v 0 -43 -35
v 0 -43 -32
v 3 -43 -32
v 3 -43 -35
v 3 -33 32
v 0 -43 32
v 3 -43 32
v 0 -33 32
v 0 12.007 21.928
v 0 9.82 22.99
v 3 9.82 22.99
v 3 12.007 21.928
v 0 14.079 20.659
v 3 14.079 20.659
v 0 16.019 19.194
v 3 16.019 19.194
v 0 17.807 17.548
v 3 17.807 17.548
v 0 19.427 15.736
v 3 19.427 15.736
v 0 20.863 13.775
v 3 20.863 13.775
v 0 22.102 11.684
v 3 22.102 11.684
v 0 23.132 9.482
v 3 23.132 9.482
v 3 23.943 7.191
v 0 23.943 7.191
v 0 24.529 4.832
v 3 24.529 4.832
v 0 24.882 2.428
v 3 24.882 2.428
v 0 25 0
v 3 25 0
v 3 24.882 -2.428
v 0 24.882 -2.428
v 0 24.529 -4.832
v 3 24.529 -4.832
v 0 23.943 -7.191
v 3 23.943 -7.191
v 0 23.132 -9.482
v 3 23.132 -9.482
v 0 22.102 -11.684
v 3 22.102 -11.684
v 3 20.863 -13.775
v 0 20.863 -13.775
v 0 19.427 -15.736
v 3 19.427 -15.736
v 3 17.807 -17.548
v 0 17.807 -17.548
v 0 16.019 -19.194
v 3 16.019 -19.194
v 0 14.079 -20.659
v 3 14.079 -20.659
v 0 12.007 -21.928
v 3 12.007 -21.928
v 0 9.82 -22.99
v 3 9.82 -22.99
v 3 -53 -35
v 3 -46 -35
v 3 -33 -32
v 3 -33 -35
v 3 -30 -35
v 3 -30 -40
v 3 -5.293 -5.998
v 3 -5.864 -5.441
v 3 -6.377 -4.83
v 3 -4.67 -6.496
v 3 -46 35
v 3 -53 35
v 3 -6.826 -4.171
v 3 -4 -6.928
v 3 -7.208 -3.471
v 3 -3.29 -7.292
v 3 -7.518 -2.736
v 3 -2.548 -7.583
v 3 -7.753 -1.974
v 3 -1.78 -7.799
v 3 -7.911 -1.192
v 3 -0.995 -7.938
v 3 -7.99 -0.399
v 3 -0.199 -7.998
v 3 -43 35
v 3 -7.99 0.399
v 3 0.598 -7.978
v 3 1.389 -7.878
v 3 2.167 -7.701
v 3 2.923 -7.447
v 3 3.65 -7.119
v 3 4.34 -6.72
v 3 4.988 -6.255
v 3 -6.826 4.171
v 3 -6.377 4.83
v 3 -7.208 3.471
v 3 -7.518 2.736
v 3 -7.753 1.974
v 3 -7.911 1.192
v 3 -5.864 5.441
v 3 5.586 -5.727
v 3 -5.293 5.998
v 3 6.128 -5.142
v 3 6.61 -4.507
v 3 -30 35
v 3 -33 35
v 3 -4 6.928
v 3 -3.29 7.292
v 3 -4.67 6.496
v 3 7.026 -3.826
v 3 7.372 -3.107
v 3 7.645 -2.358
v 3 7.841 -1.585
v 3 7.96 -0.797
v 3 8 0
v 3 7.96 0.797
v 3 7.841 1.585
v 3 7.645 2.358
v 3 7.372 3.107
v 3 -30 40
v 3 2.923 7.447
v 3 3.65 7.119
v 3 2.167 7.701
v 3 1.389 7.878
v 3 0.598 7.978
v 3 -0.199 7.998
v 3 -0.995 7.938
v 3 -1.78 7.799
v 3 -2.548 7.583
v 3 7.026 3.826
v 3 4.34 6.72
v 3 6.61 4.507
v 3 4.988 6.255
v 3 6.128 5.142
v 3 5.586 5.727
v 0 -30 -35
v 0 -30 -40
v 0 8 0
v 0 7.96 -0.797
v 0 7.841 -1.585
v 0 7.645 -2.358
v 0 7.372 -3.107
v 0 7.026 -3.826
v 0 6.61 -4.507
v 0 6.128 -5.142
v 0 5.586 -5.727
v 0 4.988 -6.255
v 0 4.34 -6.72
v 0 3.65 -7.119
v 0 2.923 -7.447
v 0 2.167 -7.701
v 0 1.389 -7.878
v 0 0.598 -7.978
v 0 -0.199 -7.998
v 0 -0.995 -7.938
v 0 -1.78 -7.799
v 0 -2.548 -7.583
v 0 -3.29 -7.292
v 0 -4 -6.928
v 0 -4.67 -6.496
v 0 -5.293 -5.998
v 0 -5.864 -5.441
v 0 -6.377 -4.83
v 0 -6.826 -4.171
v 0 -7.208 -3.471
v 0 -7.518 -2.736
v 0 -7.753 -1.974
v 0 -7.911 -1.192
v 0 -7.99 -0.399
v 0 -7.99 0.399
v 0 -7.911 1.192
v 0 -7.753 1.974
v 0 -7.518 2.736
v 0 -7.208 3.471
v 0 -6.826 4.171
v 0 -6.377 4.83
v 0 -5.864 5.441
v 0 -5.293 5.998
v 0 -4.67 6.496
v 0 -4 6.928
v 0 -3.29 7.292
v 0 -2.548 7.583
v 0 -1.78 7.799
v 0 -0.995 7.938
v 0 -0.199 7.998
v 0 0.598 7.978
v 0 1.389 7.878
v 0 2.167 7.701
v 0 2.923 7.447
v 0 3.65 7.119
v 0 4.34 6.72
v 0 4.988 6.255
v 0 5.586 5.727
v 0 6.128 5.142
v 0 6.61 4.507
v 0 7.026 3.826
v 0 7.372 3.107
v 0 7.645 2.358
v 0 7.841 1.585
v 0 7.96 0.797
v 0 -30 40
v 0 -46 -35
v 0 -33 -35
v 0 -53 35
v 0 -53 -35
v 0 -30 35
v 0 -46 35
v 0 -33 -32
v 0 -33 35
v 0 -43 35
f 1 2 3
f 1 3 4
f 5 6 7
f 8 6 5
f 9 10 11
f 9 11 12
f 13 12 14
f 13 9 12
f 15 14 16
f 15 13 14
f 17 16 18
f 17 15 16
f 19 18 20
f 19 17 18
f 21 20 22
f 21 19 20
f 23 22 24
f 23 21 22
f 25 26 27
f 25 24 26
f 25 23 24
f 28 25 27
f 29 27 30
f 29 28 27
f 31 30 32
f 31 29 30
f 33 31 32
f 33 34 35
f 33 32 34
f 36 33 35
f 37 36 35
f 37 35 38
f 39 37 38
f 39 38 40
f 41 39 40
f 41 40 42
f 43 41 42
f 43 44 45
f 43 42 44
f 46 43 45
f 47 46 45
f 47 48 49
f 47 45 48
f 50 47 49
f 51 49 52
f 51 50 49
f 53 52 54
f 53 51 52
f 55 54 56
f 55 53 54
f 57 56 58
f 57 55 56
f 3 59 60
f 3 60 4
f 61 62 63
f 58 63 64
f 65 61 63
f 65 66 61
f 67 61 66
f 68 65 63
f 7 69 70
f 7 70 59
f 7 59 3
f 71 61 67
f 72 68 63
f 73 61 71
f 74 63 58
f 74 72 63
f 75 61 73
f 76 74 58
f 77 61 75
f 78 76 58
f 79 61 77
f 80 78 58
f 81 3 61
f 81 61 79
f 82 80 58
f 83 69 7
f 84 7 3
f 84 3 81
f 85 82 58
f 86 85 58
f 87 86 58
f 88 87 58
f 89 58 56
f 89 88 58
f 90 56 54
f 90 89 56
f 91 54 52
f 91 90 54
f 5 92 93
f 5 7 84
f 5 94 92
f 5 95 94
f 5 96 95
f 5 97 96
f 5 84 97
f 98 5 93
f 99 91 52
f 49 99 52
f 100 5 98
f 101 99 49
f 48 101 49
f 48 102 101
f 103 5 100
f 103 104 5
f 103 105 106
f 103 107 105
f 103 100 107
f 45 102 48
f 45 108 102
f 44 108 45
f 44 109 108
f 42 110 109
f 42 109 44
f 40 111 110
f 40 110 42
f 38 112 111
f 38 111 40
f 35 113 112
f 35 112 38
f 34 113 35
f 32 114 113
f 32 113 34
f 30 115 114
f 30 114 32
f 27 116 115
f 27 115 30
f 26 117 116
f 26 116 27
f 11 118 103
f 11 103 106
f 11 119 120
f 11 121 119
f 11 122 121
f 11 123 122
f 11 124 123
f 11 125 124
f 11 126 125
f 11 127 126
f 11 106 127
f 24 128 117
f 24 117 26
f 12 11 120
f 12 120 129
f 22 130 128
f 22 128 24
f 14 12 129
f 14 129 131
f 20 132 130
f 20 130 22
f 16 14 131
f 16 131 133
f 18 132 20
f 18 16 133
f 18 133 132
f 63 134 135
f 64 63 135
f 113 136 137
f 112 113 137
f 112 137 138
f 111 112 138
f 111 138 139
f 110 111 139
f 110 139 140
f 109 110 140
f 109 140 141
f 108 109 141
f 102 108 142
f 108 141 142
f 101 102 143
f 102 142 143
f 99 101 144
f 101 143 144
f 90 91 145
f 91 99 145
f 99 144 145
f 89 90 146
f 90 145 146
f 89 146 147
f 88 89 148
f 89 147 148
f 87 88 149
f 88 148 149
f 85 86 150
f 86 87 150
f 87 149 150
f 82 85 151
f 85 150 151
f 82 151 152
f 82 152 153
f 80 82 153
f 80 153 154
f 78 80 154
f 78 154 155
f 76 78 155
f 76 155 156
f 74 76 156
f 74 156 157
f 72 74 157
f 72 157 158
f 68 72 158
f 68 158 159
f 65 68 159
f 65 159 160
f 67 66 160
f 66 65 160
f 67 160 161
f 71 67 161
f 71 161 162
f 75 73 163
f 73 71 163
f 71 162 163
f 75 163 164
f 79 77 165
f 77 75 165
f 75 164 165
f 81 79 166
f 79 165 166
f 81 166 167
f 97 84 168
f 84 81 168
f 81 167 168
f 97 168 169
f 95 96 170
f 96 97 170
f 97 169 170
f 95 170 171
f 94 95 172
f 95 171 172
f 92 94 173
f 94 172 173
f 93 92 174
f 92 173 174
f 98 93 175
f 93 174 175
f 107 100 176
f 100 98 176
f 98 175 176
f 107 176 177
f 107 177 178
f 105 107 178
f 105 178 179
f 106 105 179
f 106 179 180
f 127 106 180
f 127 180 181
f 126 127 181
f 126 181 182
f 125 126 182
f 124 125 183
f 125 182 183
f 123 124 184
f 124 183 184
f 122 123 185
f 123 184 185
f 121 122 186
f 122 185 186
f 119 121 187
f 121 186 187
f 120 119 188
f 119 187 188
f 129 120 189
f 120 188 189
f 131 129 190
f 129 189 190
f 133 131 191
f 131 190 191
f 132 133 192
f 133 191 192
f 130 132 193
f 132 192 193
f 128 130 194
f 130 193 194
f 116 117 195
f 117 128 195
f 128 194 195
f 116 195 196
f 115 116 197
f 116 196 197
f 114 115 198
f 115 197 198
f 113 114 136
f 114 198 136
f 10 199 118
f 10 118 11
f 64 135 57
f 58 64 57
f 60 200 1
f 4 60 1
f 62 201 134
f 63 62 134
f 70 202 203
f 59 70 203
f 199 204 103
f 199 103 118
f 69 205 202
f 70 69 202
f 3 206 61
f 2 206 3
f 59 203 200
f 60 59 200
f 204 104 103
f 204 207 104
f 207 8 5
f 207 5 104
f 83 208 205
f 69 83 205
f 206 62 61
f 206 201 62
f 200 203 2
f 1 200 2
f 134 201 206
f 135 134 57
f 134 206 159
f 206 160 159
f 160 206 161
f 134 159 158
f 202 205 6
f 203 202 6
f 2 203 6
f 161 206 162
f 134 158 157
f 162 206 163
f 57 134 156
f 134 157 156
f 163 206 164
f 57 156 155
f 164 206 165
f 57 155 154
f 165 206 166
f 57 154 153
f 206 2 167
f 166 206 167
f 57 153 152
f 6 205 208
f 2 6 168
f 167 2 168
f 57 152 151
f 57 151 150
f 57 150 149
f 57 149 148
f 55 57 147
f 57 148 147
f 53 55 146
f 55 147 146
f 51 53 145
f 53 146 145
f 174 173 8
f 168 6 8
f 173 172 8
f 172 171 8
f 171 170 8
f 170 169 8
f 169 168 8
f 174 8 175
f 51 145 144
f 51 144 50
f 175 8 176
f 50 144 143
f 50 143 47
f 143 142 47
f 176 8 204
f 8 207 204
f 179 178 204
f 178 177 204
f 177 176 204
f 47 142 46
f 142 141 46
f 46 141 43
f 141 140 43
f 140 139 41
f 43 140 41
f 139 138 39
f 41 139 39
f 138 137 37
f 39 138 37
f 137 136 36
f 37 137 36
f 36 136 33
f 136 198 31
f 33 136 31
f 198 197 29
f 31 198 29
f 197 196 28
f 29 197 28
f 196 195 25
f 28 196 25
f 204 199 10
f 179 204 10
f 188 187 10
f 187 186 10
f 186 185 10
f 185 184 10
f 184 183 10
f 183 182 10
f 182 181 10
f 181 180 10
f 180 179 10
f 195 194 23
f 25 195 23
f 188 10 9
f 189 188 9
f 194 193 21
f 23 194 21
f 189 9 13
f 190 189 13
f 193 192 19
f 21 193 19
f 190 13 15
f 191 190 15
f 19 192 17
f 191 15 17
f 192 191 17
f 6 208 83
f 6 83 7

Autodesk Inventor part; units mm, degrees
ref_plane "YZ Plane" through (0, 0, 0) normal (1, 0, 0) x (0, 1, 0)
ref_plane "XZ Plane" through (0, 0, 0) normal (0, 1, 0) x (-1, 0, 0)
ref_plane "XY Plane" through (0, 0, 0) normal (0, 0, 1) x (1, 0, 0)
sketch "Sketch1" plane through (0, 0, 0) normal (1, 0, 0) x (0, 1, 0)
  circle A0 centre (0, 0) radius 8
  arc A1 (-25, 0) -> (9.8205, -22.9904) centre (0, 0) ccw construction
  line L0 (0, 0) -> (-30, 0) construction
  line L1 (-30, 0) -> (-30, -35) construction
  line L2 (-30, -40) -> (9.8205, -22.9904)
  line L3 (-30, 0) -> (-30, 35) construction
  line L4 (-30, 40) -> (9.8205, 22.9904)
  line L5 (-30, 0) -> (-33, 0) construction
  line L6 (-33, 0) -> (-33, -35) construction
  line L7 (-33, -35) -> (-30, -35)
  line L8 (-33, 0) -> (-33, 32) construction
  line L9 (-33, 35) -> (-30, 35)
  line L10 (-33, 35) -> (-43, 35) construction
  line L11 (-43, 35) -> (-43, -32) construction
  line L12 (-43, -35) -> (-33, -35) construction
  line L13 (-33, -35) -> (-33, -32)
  line L14 (-33, 35) -> (-43, 35) construction
  line L15 (-43, 35) -> (-43, 32)
  line L16 (-43, 32) -> (-33, 32)
  line L17 (-33, 32) -> (-33, 35)
  line L18 (-43, -35) -> (-33, -35) construction
  line L19 (-33, -35) -> (-33, -32)
  line L20 (-33, -32) -> (-43, -32)
  line L21 (-43, -32) -> (-43, -35)
  line L22 (-43, 35) -> (-46, 35)
  line L23 (-46, 35) -> (-46, -35) construction
  line L24 (-46, -35) -> (-43, -35)
  line L25 (-43, -35) -> (-43, -32)
  arc A2 (9.8205, 22.9904) -> (-25, 0) centre (0, 0) ccw construction
  arc A3 (9.8205, -22.9904) -> (9.8205, 22.9904) centre (0, 0) ccw
  line L26 (-30, 35) -> (-30, 40)
  line L27 (-30, -35) -> (-30, -40)
  line L28 (-33, 32) -> (-33, 35)
  line L29 (-33, -32) -> (-33, 35) construction
  line L30 (-43, -32) -> (-43, -35)
  line L31 (-43, 32) -> (-43, 35)
  line L32 (-43, -32) -> (-43, 32) construction
  line L33 (-46, 35) -> (-53, 35)
  line L34 (-53, 35) -> (-53, -35)
  line L35 (-53, -35) -> (-46, -35)
  point P0 (-43, -25)
  dimension "d0" = 16
  dimension "d1" = 50
  dimension "d2" = 30
  dimension "d4" = 40
  dimension "d5" = 40
  dimension "d8" = 3
  dimension "d19" = 10
  dimension "d20" = 70
  dimension "d21" = 3
  dimension "d22" = 3
  dimension "d23" = 3
  dimension "d24" = 35
  dimension "d25" = 7
  dimension "d26" = 70
  dimension "d27" = 7
extrude "Extrusion1" add sketch "Sketch1" along normal blind 3
properties part number "baseSoporte2" material "PMMA Plastic"
